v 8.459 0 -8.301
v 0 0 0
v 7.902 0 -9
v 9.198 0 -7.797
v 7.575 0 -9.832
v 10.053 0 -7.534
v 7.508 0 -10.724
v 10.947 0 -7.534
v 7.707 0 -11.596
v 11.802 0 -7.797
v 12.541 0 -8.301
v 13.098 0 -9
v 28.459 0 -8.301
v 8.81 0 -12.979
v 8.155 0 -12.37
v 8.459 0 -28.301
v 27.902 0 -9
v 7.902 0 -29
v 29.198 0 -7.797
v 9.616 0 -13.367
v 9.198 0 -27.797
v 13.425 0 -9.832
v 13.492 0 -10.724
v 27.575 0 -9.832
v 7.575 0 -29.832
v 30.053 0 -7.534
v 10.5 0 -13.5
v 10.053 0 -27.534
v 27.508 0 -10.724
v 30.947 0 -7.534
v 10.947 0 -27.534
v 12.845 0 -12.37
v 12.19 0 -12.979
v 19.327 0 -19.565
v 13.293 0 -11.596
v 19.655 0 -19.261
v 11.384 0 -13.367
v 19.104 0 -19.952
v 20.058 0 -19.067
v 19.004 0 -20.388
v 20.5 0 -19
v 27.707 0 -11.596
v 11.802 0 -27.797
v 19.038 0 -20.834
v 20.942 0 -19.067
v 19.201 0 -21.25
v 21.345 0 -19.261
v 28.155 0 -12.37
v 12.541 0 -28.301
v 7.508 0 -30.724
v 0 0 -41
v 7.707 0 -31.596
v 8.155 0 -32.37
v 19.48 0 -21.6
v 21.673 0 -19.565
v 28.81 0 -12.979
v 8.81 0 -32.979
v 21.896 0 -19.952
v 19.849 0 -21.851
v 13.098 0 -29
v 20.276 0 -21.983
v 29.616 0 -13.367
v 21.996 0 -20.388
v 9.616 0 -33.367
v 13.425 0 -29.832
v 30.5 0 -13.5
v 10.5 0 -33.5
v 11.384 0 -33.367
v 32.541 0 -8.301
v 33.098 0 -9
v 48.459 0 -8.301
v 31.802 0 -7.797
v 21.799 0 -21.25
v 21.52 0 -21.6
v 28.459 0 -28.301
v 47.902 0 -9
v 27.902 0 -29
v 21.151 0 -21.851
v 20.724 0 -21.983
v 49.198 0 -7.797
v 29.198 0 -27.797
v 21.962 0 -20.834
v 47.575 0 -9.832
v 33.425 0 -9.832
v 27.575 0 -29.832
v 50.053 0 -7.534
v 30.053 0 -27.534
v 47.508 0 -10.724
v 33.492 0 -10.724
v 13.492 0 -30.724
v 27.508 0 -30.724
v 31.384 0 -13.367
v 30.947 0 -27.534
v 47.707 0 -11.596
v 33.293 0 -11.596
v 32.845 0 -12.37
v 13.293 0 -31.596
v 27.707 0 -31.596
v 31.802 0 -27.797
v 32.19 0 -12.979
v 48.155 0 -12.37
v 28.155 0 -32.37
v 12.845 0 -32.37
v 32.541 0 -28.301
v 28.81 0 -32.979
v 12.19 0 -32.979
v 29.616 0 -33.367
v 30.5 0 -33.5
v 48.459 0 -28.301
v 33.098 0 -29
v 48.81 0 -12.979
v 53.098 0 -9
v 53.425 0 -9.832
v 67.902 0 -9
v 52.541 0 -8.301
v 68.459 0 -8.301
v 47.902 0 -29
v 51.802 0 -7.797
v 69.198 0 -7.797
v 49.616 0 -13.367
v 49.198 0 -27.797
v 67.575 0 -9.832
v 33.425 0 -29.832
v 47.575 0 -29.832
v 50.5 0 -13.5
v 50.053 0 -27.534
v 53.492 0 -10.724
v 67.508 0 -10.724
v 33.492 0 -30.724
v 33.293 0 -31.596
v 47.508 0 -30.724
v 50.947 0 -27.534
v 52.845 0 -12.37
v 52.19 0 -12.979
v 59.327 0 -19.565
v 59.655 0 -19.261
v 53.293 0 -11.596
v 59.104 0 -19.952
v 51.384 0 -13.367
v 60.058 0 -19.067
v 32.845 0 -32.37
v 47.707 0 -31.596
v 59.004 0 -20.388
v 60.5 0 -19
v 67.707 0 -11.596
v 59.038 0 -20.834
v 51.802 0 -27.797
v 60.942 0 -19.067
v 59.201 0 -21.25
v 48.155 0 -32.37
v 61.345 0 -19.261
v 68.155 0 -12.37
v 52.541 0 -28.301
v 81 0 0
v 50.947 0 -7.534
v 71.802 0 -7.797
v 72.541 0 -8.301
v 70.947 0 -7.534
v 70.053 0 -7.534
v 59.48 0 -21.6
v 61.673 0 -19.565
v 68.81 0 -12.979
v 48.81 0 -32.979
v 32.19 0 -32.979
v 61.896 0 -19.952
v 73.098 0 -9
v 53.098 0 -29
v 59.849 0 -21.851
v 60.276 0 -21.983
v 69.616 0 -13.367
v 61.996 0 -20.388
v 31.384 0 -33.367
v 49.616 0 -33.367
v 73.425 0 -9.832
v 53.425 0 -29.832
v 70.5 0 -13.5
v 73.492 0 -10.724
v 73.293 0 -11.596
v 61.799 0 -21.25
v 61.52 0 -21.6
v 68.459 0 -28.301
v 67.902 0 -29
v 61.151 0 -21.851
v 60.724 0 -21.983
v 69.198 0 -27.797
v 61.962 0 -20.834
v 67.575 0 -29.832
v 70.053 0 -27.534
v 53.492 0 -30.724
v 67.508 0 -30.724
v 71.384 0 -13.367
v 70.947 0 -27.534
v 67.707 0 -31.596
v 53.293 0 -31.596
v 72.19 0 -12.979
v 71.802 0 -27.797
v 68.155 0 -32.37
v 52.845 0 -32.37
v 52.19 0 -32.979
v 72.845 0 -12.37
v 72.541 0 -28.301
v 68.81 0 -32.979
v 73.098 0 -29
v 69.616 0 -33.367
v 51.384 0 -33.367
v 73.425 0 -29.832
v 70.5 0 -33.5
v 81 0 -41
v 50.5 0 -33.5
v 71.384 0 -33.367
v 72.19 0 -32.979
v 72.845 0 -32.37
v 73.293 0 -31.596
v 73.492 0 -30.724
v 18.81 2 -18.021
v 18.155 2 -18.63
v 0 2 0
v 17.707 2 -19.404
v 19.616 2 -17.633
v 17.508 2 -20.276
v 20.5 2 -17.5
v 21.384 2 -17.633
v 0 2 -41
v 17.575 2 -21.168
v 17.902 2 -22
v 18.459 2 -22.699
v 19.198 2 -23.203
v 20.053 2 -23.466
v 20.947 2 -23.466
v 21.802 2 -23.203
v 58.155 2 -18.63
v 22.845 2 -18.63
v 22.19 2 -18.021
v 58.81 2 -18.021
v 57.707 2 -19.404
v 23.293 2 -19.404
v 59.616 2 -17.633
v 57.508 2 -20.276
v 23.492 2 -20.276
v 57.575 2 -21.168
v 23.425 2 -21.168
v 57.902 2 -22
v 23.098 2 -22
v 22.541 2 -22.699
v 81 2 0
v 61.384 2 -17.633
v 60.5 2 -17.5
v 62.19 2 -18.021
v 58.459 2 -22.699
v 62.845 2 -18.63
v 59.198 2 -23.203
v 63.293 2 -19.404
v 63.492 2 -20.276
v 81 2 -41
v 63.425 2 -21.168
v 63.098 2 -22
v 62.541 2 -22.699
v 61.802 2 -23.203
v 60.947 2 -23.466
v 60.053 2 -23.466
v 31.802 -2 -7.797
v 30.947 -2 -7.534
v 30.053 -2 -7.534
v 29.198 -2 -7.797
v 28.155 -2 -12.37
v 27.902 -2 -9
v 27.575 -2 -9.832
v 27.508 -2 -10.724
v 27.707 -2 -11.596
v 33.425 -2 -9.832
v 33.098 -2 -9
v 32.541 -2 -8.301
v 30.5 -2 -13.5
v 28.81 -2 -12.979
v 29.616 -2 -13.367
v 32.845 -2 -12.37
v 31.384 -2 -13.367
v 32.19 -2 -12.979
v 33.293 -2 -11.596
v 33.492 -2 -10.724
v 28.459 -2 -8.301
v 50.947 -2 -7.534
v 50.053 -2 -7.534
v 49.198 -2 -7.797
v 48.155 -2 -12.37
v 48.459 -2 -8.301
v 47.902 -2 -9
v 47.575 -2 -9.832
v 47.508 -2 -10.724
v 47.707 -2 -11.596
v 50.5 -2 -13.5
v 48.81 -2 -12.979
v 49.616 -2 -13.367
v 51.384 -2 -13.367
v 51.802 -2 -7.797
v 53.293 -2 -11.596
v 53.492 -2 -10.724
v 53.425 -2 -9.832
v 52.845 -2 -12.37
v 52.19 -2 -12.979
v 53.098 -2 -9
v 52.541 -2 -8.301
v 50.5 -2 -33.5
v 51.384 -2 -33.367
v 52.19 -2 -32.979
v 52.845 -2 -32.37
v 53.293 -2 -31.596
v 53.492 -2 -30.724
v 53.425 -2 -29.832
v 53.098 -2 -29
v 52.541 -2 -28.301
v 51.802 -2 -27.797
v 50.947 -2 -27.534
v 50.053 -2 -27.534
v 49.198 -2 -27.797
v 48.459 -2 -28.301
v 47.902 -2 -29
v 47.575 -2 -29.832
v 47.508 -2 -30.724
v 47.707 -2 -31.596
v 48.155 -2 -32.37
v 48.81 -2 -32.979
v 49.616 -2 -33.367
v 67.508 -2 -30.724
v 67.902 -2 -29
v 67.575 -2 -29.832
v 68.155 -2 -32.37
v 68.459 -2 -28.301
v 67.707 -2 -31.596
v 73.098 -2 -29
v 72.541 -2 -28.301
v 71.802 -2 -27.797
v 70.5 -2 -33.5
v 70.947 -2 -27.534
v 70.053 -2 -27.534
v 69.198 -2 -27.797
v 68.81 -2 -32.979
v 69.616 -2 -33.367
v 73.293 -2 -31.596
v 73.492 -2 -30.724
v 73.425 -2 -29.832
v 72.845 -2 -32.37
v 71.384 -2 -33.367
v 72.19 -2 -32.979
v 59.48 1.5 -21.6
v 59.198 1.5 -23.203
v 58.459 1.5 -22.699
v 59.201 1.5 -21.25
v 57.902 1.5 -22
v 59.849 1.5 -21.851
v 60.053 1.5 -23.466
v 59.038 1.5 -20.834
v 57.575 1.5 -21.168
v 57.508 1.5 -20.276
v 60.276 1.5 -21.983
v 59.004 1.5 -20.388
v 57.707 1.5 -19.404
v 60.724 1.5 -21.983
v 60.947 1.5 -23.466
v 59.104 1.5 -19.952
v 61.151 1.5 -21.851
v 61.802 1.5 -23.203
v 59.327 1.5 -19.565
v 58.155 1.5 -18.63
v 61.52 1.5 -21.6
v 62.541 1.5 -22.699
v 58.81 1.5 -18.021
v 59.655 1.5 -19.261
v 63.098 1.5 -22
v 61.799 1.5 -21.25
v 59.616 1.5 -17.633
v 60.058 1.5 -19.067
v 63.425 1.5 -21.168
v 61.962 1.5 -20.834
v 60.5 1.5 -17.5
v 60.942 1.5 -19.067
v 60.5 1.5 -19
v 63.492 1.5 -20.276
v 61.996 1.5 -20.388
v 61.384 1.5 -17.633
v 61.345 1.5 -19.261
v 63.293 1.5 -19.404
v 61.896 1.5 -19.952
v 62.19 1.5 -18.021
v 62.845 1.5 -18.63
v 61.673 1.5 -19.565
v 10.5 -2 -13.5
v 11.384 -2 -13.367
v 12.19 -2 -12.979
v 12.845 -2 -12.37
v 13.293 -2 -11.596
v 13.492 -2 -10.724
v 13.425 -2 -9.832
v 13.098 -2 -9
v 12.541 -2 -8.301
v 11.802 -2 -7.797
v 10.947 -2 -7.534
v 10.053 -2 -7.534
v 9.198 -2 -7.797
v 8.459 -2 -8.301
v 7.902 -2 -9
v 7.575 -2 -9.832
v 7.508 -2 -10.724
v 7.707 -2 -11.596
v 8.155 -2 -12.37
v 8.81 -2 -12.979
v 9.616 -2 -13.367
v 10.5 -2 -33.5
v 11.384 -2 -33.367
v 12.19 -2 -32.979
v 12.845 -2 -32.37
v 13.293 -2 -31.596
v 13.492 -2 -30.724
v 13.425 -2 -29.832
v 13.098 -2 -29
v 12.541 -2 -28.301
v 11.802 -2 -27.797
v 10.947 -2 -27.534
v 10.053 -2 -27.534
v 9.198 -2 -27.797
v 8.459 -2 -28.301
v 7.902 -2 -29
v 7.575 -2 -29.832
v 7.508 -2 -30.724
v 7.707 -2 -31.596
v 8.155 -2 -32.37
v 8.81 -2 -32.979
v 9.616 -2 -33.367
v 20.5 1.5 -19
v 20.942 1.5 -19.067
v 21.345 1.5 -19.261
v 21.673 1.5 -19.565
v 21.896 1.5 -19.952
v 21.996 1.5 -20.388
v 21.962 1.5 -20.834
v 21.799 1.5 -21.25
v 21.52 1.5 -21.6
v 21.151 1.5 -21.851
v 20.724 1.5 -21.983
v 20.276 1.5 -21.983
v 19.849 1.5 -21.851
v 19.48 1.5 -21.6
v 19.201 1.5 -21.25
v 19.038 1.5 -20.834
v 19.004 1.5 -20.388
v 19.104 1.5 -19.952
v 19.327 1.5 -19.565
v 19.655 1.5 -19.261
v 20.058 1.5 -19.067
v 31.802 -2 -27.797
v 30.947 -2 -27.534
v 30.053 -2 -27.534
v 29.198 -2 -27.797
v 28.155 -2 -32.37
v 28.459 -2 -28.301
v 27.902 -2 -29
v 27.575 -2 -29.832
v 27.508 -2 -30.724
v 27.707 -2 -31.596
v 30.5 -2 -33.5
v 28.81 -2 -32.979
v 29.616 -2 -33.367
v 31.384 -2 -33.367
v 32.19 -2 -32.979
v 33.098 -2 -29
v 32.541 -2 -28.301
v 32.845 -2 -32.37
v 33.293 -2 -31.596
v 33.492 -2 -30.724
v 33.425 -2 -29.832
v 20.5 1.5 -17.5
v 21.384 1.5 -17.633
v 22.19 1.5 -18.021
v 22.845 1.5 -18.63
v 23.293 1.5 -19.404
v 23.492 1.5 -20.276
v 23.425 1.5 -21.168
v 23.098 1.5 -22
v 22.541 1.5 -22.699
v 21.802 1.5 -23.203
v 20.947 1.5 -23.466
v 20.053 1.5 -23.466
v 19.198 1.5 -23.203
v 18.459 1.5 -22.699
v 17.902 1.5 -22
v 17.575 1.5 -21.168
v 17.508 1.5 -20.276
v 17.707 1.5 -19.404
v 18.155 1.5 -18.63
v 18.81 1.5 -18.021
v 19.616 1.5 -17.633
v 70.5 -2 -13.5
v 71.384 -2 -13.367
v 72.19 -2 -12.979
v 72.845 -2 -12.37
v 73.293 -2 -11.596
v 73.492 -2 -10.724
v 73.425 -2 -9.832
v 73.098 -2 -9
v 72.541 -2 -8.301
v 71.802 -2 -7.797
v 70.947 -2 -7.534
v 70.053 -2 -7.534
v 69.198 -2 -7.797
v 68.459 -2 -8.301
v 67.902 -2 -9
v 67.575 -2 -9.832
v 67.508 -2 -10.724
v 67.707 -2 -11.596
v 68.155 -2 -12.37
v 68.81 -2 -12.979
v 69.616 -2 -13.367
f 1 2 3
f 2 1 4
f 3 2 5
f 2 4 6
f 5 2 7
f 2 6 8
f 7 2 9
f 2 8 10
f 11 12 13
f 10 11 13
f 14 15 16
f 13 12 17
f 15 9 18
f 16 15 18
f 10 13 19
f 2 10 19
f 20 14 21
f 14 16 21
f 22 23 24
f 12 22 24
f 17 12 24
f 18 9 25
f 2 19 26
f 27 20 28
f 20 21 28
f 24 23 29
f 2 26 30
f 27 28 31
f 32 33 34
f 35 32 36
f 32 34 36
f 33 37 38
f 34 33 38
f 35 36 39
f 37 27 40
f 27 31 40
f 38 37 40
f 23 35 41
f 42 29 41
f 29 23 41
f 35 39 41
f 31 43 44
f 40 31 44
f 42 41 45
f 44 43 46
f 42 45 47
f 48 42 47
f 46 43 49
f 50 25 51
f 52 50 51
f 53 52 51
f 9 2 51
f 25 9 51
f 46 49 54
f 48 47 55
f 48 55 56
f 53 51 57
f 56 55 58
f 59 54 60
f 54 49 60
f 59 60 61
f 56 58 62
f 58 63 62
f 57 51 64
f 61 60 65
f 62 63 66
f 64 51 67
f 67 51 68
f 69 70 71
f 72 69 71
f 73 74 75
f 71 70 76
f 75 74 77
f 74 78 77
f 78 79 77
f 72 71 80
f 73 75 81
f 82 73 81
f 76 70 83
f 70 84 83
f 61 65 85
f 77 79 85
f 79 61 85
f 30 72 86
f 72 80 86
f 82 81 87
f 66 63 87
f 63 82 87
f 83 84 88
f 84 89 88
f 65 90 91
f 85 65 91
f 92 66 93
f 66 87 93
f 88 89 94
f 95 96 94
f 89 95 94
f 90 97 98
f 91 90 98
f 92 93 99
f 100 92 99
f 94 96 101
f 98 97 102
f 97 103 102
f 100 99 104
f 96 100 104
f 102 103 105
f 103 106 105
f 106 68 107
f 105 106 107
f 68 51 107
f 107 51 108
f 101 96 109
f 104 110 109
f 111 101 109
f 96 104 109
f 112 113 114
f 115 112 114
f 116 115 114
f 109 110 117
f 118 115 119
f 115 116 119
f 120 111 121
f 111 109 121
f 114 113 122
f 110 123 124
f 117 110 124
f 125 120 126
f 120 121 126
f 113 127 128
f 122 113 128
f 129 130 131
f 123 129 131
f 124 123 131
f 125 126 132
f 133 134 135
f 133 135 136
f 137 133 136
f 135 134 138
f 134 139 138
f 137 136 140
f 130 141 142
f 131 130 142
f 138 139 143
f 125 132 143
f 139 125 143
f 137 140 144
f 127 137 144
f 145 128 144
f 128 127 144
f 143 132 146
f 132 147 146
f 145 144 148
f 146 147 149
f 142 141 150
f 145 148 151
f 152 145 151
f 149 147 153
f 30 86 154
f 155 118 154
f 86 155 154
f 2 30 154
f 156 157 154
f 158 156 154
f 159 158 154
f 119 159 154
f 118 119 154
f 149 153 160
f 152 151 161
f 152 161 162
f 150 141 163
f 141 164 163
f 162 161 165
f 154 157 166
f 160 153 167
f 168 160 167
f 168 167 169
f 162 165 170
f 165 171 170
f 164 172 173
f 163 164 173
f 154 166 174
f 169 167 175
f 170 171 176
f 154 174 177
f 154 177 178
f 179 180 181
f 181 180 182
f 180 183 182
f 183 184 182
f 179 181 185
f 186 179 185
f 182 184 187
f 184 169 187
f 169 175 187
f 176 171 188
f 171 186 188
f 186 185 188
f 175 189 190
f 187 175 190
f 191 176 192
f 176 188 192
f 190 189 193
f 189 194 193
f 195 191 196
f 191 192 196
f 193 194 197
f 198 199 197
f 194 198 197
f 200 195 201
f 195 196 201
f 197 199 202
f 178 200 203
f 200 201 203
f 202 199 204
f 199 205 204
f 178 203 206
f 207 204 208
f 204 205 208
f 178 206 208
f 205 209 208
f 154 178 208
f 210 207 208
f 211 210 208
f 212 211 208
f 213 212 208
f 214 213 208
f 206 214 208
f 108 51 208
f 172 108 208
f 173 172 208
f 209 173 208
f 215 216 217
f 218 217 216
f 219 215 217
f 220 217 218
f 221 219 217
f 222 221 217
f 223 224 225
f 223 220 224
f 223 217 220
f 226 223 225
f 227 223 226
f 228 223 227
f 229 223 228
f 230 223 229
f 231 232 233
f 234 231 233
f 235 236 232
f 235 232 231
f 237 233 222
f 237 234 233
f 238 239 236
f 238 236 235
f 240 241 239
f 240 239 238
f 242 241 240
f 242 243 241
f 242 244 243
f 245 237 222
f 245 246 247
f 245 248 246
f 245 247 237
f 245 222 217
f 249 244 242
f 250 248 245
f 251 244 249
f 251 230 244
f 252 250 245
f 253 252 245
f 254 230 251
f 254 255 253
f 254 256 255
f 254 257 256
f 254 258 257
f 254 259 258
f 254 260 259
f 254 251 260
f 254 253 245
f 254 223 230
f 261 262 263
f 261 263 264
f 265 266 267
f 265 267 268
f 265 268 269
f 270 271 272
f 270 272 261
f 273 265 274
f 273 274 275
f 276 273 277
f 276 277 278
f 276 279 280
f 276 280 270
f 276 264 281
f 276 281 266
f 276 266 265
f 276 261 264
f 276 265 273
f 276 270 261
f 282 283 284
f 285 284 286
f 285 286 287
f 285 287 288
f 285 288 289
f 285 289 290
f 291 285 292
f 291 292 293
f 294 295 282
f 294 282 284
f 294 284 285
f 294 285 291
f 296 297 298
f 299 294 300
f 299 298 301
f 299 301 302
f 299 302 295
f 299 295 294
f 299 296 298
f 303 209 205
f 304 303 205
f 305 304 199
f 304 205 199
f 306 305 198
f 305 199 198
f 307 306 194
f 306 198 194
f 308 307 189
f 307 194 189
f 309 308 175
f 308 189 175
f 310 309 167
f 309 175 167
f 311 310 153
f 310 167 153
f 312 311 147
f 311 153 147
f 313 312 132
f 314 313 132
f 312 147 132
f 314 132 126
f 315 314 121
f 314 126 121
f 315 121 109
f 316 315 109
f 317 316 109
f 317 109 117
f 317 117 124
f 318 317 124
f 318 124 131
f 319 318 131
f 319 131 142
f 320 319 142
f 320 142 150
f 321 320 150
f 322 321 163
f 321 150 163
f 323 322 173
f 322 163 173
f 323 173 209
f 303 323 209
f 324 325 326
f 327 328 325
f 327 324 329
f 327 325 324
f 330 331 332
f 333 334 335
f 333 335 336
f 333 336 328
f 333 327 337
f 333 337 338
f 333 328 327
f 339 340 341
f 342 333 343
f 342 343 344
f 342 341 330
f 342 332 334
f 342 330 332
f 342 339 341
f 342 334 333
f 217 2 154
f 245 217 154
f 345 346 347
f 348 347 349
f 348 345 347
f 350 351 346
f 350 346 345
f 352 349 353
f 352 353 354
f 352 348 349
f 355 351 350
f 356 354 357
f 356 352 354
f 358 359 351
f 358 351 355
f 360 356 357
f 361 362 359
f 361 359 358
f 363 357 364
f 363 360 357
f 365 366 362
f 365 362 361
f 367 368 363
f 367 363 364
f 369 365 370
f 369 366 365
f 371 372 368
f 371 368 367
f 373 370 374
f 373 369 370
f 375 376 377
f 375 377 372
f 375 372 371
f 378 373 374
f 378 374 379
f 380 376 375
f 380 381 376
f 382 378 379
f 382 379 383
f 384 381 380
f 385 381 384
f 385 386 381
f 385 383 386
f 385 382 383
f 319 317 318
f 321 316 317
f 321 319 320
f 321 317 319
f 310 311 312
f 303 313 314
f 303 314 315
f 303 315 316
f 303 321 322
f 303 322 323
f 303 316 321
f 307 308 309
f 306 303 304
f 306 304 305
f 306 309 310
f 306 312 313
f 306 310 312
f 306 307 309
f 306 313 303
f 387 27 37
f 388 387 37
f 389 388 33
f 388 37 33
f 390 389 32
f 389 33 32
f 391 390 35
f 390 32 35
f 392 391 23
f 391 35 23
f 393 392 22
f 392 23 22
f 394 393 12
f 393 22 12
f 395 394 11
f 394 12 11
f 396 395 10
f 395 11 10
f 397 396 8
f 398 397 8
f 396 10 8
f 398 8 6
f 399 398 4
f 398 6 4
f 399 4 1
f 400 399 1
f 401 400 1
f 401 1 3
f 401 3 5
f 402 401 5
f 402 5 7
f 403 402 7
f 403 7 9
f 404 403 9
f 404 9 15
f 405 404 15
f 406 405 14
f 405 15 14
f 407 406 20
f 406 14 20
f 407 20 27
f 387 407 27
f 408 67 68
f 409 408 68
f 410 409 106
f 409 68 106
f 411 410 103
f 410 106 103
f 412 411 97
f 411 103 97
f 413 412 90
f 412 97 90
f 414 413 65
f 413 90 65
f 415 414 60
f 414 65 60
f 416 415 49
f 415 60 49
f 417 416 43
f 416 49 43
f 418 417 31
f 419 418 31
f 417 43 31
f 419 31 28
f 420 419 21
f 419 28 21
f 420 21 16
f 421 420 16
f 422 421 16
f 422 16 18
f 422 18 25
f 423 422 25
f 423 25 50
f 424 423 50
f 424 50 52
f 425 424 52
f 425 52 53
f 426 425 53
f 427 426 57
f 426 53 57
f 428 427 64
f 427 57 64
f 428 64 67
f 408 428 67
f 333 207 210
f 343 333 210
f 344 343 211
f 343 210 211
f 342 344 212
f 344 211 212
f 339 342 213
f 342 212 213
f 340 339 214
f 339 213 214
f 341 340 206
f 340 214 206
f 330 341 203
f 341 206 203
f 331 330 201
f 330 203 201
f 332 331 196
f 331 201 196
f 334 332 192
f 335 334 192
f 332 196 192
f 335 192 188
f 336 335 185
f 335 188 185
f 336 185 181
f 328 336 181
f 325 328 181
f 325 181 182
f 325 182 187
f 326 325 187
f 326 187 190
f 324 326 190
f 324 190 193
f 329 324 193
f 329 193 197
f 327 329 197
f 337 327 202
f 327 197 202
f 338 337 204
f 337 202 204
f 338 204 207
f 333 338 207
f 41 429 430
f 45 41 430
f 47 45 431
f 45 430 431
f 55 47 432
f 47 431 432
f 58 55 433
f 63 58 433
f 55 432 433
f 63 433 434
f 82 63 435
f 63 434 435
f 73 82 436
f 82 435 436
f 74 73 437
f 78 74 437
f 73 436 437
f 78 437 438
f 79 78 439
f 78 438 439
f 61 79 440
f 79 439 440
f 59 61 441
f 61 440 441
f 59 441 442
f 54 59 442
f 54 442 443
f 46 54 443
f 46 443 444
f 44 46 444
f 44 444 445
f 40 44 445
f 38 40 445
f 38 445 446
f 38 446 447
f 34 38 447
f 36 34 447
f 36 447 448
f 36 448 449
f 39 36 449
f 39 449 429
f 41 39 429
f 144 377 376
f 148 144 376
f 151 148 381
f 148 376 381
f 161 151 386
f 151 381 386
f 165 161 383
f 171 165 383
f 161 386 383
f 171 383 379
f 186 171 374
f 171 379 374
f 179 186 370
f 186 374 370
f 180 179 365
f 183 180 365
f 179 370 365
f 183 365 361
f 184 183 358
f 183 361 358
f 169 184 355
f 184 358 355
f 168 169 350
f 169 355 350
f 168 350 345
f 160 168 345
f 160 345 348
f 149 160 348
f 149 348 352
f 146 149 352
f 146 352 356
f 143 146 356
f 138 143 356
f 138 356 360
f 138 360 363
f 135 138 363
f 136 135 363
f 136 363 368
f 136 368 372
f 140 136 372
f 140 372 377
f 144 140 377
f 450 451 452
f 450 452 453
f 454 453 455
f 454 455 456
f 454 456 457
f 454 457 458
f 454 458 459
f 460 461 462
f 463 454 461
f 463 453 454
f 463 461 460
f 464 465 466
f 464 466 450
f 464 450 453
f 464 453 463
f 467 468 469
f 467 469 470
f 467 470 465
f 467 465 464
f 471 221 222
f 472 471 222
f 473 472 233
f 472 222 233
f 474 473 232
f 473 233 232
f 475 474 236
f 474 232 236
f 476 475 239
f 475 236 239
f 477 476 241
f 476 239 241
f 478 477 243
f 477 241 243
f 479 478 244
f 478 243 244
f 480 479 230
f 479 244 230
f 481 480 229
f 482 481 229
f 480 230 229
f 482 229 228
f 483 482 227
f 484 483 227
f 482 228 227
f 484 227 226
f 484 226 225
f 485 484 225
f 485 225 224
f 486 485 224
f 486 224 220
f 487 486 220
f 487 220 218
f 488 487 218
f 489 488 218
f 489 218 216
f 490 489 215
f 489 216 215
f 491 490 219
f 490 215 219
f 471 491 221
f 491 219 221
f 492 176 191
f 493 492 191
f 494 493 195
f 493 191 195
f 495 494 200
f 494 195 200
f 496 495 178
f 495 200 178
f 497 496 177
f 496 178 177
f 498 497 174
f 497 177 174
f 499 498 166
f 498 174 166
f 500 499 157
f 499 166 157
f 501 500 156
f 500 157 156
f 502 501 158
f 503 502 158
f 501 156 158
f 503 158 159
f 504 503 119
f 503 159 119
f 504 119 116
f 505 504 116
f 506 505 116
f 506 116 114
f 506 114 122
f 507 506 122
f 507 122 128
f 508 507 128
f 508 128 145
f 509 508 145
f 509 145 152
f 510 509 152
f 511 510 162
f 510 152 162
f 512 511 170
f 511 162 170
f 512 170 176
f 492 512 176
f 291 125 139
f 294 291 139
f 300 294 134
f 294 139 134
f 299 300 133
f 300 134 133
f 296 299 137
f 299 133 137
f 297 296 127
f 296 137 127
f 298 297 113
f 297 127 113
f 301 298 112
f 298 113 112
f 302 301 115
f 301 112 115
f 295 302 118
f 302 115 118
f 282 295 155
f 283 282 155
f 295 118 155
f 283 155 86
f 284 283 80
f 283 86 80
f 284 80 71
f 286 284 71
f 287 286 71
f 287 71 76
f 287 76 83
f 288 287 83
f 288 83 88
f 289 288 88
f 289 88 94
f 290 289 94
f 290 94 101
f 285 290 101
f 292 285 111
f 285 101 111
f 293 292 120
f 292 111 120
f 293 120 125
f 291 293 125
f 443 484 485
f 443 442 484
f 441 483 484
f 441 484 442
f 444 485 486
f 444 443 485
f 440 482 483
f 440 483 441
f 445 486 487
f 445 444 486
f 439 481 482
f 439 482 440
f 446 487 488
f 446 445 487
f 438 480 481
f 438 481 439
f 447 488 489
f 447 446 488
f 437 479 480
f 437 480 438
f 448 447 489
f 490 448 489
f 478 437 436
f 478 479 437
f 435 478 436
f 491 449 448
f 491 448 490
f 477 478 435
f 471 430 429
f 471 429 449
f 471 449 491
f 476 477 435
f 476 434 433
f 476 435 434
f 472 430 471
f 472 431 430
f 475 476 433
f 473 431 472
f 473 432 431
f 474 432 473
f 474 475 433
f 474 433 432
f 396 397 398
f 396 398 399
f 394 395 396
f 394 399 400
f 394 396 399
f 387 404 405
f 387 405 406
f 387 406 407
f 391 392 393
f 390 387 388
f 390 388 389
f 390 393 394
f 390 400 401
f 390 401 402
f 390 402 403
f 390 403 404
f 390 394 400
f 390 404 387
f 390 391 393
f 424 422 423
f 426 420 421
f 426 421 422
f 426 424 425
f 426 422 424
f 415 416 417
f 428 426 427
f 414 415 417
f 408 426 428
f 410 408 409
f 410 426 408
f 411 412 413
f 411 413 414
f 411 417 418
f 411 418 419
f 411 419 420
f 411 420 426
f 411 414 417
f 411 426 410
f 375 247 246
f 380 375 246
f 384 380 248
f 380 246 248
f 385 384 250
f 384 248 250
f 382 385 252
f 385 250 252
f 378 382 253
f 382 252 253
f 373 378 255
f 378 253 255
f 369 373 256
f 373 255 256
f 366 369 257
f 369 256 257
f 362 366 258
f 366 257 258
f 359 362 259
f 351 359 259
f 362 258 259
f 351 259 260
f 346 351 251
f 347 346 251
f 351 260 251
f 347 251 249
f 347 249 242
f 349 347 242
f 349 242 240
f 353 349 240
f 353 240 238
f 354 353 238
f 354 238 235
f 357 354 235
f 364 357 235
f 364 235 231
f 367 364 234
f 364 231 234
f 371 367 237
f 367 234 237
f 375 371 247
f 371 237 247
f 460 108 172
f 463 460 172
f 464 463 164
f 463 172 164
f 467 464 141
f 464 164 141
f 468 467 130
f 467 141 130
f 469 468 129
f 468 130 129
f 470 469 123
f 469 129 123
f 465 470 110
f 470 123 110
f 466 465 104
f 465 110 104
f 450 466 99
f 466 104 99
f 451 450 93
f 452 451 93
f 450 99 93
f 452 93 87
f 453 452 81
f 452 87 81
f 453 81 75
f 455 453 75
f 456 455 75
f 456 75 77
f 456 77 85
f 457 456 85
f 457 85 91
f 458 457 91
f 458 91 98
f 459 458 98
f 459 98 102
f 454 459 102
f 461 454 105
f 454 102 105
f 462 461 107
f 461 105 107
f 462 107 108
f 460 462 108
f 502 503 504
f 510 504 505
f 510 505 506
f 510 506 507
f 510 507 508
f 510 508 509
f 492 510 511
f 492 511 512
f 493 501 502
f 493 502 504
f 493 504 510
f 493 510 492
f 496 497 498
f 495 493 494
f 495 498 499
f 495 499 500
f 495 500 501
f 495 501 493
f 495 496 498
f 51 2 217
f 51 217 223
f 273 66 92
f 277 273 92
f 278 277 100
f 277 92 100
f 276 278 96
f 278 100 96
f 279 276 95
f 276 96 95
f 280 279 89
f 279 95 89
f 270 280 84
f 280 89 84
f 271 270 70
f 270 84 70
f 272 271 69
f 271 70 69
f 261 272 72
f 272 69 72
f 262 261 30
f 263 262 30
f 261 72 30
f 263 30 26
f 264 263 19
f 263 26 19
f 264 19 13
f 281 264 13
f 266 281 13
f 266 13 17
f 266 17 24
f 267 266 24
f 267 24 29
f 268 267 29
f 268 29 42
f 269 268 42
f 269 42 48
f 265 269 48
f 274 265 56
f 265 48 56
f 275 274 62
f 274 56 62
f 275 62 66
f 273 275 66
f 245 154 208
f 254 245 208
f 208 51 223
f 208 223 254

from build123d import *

# Parameters (mm, degrees)
SKETCH1_W           = 81
SKETCH1_H           = 41
BOSS_EXTRUDE1_DEPTH = 2
SKETCH2_R           = 3
CUT_EXTRUDE1_DEPTH  = 0.5
SKETCH3_R           = 1.5
CUT_EXTRUDE2_DEPTH  = 91.797852398
SKETCH4_R           = 3
BOSS_EXTRUDE2_DEPTH = 2


with BuildPart() as part:
    # Sketch1 → Boss-Extrude1 (new body)
    with BuildSketch(Plane(origin=(0, 0, 0), x_dir=(1, 0, 0), z_dir=(0, 1, 0))):
        with Locations((40.5, 20.5)):
            Rectangle(SKETCH1_W, SKETCH1_H)
    extrude(amount=BOSS_EXTRUDE1_DEPTH)

    # Sketch2 → Cut-Extrude1 (cut)
    with BuildSketch(Plane(origin=(0, 2, 0), x_dir=(1, 0, 0), z_dir=(0, 1, 0))):
        with Locations(Location((20.5, 20.5, 0), (0, 0, 270))):
            Circle(SKETCH2_R)
        with Locations(Location((60.5, 20.5, 0), (0, 0, 270))):
            Circle(SKETCH2_R)
    extrude(amount=-CUT_EXTRUDE1_DEPTH, mode=Mode.SUBTRACT)

    # Sketch3 → Cut-Extrude2 (cut, through all)
    with BuildSketch(Plane(origin=(0, 1.5, 0), x_dir=(1, 0, 0), z_dir=(0, 1, 0))):
        with Locations(Location((20.5, 20.5, 0), (0, 0, 270))):
            Circle(SKETCH3_R)
        with Locations(Location((60.5, 20.5, 0), (0, 0, 270))):
            Circle(SKETCH3_R)
    extrude(amount=-CUT_EXTRUDE2_DEPTH, mode=Mode.SUBTRACT)

    # Sketch4 → Boss-Extrude2 (add)
    with BuildSketch(Plane.XZ):
        with Locations(Location((70.5, -30.5, 0), (0, 0, 270))):
            Circle(SKETCH4_R)
        with Locations(Location((50.5, -30.5, 0), (0, 0, 270))):
            Circle(SKETCH4_R)
        with Locations(Location((30.5, -30.5, 0), (0, 0, 270))):
            Circle(SKETCH4_R)
        with Locations(Location((10.5, -30.5, 0), (0, 0, 270))):
            Circle(SKETCH4_R)
        with Locations(Location((50.5, -10.5, 0), (0, 0, 270))):
            Circle(SKETCH4_R)
        with Locations(Location((30.5, -10.5, 0), (0, 0, 270))):
            Circle(SKETCH4_R)
        with Locations(Location((10.5, -10.5, 0), (0, 0, 270))):
            Circle(SKETCH4_R)
        with Locations(Location((70.5, -10.5, 0), (0, 0, 270))):
            Circle(SKETCH4_R)
    extrude(amount=BOSS_EXTRUDE2_DEPTH)


solid = part.part
